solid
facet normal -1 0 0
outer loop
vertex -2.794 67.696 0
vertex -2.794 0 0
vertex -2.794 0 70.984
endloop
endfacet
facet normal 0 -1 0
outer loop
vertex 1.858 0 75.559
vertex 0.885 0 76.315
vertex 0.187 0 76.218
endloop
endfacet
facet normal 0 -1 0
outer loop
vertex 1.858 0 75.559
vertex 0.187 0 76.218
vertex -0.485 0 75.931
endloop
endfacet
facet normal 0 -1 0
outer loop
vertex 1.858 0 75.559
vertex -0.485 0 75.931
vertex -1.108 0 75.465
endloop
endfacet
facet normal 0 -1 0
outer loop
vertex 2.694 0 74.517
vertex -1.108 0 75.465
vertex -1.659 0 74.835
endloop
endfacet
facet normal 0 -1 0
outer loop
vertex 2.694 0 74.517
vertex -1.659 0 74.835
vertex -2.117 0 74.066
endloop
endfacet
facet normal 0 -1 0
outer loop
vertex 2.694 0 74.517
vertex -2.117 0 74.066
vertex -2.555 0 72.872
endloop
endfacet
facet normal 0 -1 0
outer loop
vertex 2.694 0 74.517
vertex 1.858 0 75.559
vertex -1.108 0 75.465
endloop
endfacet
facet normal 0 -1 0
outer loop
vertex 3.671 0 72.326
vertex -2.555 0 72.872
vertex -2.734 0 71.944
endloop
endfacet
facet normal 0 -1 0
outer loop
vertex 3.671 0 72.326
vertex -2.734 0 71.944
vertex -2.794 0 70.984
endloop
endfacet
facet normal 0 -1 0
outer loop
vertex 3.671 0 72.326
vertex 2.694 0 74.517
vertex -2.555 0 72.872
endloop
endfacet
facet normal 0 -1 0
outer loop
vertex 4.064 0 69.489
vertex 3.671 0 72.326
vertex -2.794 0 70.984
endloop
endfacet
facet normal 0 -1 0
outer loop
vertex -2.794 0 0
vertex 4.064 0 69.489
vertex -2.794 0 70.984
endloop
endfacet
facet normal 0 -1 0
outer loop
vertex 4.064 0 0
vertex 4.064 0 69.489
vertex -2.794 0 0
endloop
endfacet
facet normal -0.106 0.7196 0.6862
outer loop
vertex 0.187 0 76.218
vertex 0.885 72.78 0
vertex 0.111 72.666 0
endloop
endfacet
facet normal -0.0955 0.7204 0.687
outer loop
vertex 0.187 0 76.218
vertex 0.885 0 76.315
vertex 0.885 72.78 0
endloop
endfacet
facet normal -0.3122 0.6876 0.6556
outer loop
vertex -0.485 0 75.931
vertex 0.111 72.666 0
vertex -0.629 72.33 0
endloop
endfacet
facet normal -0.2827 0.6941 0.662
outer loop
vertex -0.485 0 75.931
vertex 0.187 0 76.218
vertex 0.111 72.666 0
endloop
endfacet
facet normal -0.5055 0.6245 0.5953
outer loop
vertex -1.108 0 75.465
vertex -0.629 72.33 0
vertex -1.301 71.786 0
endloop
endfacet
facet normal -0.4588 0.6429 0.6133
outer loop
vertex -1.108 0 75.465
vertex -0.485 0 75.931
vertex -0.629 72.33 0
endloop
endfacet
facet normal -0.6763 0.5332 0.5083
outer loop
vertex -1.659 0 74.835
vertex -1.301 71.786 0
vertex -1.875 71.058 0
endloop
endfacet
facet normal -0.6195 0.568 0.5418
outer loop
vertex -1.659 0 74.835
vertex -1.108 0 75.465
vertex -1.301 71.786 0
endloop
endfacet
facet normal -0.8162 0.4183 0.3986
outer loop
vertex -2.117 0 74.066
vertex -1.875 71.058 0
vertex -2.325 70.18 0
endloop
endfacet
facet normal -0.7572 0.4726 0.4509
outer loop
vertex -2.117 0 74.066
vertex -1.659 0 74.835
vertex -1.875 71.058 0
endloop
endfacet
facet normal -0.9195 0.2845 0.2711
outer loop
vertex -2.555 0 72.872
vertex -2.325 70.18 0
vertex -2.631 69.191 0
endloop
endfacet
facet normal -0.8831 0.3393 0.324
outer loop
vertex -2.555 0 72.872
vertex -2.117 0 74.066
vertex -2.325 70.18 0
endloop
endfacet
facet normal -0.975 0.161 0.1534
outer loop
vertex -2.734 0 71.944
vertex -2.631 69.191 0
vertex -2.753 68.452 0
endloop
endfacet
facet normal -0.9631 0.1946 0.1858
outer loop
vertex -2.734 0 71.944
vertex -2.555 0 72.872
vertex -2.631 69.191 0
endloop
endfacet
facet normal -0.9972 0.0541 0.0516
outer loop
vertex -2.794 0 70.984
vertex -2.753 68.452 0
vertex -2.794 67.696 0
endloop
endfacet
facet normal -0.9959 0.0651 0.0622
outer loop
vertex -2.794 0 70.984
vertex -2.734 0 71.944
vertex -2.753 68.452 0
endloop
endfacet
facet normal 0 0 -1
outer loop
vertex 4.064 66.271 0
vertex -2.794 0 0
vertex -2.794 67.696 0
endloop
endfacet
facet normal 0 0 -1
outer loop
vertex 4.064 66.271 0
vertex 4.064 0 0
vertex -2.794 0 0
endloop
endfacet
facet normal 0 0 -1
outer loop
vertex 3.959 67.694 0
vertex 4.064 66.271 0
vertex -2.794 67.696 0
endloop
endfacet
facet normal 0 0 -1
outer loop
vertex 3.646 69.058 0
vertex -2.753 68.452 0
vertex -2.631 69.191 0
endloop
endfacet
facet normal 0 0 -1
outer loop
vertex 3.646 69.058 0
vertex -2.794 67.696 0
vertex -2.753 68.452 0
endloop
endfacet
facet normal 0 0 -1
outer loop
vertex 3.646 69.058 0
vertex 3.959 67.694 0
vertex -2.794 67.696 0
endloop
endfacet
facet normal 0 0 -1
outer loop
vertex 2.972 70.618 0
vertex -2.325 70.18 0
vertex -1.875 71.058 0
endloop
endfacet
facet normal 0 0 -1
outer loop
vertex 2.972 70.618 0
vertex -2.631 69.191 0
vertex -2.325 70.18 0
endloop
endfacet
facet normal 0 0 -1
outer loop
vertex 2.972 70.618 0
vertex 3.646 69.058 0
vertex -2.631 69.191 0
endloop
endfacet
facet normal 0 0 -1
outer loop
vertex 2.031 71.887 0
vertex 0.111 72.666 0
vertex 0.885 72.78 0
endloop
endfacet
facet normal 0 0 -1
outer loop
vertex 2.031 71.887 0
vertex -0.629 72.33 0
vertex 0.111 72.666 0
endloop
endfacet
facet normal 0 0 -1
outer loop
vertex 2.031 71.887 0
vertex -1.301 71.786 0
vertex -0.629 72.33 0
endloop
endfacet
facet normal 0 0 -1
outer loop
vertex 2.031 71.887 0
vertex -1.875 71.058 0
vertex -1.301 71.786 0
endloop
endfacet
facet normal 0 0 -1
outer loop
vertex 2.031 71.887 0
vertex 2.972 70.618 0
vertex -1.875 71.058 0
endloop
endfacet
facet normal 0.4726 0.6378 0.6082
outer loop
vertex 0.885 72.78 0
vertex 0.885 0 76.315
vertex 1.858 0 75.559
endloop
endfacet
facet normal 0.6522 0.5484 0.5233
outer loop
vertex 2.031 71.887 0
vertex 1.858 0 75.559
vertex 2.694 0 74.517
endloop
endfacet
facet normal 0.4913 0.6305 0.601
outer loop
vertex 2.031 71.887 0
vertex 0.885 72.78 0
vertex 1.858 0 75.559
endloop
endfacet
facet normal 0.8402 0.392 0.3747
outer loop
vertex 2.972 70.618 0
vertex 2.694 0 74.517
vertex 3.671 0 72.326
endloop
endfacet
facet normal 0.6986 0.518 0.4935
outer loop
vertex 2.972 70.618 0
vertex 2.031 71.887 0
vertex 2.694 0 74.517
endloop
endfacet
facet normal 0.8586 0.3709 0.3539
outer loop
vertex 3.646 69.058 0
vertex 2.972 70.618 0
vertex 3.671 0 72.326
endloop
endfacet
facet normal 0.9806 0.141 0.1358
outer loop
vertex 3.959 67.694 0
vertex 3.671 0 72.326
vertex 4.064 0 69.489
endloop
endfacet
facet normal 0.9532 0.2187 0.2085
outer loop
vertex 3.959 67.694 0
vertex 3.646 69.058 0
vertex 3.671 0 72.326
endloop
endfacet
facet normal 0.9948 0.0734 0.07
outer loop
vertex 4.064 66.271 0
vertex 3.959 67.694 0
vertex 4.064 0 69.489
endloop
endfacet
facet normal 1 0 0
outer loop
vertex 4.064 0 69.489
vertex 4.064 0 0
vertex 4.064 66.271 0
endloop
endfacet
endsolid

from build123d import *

# Parameters (mm, degrees)
F1_DEPTH    = 4.064
F2_DEPTH    = 2.794
F3_R        = 3.6792614691
F4_T1_DEPTH = 129.0096523961


# Not quite as in the source:
# - a fillet or chamfer that OpenCascade refuses, or shapes differently, is made with other operations: its cross-section is extruded or revolved along the edge and cut away or added


with BuildPart() as f1:
    # F0 (on Right) → F1 (new body)
    with BuildSketch(Plane.YZ):
        Polygon((72.7801844478, 0), (0, 76.3147622347), (0, 0), align=None)
    extrude(amount=F1_DEPTH)

    # F2 (add): a face of the model
    f2_faces = [f1.faces().sort_by_distance(p)[0] for p in [
        (0, 24.2600614826, 25.4382540782),
    ]]
    extrude(f2_faces, amount=F2_DEPTH)

    # F3
    f3_edges = [f1.edges().sort_by_distance(p)[0] for p in [
        (-2.794, 36.390092, 38.157381),
    ]]
    fillet(f3_edges, radius=F3_R)

    # F4: fillet of radius 5.08 on 1 edges, made by hand

    # F4_s2 → F4_t1 (cut)
    with BuildSketch(Plane(origin=(0, 42.7935550314, -44.8718288113), x_dir=(1, 0, 0), z_dir=(0, -0.6901495666, 0.7236667574))):
        with BuildLine():
            ThreePointArc((0.8852614691, 52.6686000807), (3.1949861234, 50.7992812188), (4.064, 47.9578034574))
            Line((4.064, 47.9578034574), (4.064, 52.6686000807))
            Line((4.064, 52.6686000807), (0.8852614691, 52.6686000807))
        make_face()
    extrude(amount=F4_T1_DEPTH, mode=Mode.SUBTRACT)


solid = f1.part
